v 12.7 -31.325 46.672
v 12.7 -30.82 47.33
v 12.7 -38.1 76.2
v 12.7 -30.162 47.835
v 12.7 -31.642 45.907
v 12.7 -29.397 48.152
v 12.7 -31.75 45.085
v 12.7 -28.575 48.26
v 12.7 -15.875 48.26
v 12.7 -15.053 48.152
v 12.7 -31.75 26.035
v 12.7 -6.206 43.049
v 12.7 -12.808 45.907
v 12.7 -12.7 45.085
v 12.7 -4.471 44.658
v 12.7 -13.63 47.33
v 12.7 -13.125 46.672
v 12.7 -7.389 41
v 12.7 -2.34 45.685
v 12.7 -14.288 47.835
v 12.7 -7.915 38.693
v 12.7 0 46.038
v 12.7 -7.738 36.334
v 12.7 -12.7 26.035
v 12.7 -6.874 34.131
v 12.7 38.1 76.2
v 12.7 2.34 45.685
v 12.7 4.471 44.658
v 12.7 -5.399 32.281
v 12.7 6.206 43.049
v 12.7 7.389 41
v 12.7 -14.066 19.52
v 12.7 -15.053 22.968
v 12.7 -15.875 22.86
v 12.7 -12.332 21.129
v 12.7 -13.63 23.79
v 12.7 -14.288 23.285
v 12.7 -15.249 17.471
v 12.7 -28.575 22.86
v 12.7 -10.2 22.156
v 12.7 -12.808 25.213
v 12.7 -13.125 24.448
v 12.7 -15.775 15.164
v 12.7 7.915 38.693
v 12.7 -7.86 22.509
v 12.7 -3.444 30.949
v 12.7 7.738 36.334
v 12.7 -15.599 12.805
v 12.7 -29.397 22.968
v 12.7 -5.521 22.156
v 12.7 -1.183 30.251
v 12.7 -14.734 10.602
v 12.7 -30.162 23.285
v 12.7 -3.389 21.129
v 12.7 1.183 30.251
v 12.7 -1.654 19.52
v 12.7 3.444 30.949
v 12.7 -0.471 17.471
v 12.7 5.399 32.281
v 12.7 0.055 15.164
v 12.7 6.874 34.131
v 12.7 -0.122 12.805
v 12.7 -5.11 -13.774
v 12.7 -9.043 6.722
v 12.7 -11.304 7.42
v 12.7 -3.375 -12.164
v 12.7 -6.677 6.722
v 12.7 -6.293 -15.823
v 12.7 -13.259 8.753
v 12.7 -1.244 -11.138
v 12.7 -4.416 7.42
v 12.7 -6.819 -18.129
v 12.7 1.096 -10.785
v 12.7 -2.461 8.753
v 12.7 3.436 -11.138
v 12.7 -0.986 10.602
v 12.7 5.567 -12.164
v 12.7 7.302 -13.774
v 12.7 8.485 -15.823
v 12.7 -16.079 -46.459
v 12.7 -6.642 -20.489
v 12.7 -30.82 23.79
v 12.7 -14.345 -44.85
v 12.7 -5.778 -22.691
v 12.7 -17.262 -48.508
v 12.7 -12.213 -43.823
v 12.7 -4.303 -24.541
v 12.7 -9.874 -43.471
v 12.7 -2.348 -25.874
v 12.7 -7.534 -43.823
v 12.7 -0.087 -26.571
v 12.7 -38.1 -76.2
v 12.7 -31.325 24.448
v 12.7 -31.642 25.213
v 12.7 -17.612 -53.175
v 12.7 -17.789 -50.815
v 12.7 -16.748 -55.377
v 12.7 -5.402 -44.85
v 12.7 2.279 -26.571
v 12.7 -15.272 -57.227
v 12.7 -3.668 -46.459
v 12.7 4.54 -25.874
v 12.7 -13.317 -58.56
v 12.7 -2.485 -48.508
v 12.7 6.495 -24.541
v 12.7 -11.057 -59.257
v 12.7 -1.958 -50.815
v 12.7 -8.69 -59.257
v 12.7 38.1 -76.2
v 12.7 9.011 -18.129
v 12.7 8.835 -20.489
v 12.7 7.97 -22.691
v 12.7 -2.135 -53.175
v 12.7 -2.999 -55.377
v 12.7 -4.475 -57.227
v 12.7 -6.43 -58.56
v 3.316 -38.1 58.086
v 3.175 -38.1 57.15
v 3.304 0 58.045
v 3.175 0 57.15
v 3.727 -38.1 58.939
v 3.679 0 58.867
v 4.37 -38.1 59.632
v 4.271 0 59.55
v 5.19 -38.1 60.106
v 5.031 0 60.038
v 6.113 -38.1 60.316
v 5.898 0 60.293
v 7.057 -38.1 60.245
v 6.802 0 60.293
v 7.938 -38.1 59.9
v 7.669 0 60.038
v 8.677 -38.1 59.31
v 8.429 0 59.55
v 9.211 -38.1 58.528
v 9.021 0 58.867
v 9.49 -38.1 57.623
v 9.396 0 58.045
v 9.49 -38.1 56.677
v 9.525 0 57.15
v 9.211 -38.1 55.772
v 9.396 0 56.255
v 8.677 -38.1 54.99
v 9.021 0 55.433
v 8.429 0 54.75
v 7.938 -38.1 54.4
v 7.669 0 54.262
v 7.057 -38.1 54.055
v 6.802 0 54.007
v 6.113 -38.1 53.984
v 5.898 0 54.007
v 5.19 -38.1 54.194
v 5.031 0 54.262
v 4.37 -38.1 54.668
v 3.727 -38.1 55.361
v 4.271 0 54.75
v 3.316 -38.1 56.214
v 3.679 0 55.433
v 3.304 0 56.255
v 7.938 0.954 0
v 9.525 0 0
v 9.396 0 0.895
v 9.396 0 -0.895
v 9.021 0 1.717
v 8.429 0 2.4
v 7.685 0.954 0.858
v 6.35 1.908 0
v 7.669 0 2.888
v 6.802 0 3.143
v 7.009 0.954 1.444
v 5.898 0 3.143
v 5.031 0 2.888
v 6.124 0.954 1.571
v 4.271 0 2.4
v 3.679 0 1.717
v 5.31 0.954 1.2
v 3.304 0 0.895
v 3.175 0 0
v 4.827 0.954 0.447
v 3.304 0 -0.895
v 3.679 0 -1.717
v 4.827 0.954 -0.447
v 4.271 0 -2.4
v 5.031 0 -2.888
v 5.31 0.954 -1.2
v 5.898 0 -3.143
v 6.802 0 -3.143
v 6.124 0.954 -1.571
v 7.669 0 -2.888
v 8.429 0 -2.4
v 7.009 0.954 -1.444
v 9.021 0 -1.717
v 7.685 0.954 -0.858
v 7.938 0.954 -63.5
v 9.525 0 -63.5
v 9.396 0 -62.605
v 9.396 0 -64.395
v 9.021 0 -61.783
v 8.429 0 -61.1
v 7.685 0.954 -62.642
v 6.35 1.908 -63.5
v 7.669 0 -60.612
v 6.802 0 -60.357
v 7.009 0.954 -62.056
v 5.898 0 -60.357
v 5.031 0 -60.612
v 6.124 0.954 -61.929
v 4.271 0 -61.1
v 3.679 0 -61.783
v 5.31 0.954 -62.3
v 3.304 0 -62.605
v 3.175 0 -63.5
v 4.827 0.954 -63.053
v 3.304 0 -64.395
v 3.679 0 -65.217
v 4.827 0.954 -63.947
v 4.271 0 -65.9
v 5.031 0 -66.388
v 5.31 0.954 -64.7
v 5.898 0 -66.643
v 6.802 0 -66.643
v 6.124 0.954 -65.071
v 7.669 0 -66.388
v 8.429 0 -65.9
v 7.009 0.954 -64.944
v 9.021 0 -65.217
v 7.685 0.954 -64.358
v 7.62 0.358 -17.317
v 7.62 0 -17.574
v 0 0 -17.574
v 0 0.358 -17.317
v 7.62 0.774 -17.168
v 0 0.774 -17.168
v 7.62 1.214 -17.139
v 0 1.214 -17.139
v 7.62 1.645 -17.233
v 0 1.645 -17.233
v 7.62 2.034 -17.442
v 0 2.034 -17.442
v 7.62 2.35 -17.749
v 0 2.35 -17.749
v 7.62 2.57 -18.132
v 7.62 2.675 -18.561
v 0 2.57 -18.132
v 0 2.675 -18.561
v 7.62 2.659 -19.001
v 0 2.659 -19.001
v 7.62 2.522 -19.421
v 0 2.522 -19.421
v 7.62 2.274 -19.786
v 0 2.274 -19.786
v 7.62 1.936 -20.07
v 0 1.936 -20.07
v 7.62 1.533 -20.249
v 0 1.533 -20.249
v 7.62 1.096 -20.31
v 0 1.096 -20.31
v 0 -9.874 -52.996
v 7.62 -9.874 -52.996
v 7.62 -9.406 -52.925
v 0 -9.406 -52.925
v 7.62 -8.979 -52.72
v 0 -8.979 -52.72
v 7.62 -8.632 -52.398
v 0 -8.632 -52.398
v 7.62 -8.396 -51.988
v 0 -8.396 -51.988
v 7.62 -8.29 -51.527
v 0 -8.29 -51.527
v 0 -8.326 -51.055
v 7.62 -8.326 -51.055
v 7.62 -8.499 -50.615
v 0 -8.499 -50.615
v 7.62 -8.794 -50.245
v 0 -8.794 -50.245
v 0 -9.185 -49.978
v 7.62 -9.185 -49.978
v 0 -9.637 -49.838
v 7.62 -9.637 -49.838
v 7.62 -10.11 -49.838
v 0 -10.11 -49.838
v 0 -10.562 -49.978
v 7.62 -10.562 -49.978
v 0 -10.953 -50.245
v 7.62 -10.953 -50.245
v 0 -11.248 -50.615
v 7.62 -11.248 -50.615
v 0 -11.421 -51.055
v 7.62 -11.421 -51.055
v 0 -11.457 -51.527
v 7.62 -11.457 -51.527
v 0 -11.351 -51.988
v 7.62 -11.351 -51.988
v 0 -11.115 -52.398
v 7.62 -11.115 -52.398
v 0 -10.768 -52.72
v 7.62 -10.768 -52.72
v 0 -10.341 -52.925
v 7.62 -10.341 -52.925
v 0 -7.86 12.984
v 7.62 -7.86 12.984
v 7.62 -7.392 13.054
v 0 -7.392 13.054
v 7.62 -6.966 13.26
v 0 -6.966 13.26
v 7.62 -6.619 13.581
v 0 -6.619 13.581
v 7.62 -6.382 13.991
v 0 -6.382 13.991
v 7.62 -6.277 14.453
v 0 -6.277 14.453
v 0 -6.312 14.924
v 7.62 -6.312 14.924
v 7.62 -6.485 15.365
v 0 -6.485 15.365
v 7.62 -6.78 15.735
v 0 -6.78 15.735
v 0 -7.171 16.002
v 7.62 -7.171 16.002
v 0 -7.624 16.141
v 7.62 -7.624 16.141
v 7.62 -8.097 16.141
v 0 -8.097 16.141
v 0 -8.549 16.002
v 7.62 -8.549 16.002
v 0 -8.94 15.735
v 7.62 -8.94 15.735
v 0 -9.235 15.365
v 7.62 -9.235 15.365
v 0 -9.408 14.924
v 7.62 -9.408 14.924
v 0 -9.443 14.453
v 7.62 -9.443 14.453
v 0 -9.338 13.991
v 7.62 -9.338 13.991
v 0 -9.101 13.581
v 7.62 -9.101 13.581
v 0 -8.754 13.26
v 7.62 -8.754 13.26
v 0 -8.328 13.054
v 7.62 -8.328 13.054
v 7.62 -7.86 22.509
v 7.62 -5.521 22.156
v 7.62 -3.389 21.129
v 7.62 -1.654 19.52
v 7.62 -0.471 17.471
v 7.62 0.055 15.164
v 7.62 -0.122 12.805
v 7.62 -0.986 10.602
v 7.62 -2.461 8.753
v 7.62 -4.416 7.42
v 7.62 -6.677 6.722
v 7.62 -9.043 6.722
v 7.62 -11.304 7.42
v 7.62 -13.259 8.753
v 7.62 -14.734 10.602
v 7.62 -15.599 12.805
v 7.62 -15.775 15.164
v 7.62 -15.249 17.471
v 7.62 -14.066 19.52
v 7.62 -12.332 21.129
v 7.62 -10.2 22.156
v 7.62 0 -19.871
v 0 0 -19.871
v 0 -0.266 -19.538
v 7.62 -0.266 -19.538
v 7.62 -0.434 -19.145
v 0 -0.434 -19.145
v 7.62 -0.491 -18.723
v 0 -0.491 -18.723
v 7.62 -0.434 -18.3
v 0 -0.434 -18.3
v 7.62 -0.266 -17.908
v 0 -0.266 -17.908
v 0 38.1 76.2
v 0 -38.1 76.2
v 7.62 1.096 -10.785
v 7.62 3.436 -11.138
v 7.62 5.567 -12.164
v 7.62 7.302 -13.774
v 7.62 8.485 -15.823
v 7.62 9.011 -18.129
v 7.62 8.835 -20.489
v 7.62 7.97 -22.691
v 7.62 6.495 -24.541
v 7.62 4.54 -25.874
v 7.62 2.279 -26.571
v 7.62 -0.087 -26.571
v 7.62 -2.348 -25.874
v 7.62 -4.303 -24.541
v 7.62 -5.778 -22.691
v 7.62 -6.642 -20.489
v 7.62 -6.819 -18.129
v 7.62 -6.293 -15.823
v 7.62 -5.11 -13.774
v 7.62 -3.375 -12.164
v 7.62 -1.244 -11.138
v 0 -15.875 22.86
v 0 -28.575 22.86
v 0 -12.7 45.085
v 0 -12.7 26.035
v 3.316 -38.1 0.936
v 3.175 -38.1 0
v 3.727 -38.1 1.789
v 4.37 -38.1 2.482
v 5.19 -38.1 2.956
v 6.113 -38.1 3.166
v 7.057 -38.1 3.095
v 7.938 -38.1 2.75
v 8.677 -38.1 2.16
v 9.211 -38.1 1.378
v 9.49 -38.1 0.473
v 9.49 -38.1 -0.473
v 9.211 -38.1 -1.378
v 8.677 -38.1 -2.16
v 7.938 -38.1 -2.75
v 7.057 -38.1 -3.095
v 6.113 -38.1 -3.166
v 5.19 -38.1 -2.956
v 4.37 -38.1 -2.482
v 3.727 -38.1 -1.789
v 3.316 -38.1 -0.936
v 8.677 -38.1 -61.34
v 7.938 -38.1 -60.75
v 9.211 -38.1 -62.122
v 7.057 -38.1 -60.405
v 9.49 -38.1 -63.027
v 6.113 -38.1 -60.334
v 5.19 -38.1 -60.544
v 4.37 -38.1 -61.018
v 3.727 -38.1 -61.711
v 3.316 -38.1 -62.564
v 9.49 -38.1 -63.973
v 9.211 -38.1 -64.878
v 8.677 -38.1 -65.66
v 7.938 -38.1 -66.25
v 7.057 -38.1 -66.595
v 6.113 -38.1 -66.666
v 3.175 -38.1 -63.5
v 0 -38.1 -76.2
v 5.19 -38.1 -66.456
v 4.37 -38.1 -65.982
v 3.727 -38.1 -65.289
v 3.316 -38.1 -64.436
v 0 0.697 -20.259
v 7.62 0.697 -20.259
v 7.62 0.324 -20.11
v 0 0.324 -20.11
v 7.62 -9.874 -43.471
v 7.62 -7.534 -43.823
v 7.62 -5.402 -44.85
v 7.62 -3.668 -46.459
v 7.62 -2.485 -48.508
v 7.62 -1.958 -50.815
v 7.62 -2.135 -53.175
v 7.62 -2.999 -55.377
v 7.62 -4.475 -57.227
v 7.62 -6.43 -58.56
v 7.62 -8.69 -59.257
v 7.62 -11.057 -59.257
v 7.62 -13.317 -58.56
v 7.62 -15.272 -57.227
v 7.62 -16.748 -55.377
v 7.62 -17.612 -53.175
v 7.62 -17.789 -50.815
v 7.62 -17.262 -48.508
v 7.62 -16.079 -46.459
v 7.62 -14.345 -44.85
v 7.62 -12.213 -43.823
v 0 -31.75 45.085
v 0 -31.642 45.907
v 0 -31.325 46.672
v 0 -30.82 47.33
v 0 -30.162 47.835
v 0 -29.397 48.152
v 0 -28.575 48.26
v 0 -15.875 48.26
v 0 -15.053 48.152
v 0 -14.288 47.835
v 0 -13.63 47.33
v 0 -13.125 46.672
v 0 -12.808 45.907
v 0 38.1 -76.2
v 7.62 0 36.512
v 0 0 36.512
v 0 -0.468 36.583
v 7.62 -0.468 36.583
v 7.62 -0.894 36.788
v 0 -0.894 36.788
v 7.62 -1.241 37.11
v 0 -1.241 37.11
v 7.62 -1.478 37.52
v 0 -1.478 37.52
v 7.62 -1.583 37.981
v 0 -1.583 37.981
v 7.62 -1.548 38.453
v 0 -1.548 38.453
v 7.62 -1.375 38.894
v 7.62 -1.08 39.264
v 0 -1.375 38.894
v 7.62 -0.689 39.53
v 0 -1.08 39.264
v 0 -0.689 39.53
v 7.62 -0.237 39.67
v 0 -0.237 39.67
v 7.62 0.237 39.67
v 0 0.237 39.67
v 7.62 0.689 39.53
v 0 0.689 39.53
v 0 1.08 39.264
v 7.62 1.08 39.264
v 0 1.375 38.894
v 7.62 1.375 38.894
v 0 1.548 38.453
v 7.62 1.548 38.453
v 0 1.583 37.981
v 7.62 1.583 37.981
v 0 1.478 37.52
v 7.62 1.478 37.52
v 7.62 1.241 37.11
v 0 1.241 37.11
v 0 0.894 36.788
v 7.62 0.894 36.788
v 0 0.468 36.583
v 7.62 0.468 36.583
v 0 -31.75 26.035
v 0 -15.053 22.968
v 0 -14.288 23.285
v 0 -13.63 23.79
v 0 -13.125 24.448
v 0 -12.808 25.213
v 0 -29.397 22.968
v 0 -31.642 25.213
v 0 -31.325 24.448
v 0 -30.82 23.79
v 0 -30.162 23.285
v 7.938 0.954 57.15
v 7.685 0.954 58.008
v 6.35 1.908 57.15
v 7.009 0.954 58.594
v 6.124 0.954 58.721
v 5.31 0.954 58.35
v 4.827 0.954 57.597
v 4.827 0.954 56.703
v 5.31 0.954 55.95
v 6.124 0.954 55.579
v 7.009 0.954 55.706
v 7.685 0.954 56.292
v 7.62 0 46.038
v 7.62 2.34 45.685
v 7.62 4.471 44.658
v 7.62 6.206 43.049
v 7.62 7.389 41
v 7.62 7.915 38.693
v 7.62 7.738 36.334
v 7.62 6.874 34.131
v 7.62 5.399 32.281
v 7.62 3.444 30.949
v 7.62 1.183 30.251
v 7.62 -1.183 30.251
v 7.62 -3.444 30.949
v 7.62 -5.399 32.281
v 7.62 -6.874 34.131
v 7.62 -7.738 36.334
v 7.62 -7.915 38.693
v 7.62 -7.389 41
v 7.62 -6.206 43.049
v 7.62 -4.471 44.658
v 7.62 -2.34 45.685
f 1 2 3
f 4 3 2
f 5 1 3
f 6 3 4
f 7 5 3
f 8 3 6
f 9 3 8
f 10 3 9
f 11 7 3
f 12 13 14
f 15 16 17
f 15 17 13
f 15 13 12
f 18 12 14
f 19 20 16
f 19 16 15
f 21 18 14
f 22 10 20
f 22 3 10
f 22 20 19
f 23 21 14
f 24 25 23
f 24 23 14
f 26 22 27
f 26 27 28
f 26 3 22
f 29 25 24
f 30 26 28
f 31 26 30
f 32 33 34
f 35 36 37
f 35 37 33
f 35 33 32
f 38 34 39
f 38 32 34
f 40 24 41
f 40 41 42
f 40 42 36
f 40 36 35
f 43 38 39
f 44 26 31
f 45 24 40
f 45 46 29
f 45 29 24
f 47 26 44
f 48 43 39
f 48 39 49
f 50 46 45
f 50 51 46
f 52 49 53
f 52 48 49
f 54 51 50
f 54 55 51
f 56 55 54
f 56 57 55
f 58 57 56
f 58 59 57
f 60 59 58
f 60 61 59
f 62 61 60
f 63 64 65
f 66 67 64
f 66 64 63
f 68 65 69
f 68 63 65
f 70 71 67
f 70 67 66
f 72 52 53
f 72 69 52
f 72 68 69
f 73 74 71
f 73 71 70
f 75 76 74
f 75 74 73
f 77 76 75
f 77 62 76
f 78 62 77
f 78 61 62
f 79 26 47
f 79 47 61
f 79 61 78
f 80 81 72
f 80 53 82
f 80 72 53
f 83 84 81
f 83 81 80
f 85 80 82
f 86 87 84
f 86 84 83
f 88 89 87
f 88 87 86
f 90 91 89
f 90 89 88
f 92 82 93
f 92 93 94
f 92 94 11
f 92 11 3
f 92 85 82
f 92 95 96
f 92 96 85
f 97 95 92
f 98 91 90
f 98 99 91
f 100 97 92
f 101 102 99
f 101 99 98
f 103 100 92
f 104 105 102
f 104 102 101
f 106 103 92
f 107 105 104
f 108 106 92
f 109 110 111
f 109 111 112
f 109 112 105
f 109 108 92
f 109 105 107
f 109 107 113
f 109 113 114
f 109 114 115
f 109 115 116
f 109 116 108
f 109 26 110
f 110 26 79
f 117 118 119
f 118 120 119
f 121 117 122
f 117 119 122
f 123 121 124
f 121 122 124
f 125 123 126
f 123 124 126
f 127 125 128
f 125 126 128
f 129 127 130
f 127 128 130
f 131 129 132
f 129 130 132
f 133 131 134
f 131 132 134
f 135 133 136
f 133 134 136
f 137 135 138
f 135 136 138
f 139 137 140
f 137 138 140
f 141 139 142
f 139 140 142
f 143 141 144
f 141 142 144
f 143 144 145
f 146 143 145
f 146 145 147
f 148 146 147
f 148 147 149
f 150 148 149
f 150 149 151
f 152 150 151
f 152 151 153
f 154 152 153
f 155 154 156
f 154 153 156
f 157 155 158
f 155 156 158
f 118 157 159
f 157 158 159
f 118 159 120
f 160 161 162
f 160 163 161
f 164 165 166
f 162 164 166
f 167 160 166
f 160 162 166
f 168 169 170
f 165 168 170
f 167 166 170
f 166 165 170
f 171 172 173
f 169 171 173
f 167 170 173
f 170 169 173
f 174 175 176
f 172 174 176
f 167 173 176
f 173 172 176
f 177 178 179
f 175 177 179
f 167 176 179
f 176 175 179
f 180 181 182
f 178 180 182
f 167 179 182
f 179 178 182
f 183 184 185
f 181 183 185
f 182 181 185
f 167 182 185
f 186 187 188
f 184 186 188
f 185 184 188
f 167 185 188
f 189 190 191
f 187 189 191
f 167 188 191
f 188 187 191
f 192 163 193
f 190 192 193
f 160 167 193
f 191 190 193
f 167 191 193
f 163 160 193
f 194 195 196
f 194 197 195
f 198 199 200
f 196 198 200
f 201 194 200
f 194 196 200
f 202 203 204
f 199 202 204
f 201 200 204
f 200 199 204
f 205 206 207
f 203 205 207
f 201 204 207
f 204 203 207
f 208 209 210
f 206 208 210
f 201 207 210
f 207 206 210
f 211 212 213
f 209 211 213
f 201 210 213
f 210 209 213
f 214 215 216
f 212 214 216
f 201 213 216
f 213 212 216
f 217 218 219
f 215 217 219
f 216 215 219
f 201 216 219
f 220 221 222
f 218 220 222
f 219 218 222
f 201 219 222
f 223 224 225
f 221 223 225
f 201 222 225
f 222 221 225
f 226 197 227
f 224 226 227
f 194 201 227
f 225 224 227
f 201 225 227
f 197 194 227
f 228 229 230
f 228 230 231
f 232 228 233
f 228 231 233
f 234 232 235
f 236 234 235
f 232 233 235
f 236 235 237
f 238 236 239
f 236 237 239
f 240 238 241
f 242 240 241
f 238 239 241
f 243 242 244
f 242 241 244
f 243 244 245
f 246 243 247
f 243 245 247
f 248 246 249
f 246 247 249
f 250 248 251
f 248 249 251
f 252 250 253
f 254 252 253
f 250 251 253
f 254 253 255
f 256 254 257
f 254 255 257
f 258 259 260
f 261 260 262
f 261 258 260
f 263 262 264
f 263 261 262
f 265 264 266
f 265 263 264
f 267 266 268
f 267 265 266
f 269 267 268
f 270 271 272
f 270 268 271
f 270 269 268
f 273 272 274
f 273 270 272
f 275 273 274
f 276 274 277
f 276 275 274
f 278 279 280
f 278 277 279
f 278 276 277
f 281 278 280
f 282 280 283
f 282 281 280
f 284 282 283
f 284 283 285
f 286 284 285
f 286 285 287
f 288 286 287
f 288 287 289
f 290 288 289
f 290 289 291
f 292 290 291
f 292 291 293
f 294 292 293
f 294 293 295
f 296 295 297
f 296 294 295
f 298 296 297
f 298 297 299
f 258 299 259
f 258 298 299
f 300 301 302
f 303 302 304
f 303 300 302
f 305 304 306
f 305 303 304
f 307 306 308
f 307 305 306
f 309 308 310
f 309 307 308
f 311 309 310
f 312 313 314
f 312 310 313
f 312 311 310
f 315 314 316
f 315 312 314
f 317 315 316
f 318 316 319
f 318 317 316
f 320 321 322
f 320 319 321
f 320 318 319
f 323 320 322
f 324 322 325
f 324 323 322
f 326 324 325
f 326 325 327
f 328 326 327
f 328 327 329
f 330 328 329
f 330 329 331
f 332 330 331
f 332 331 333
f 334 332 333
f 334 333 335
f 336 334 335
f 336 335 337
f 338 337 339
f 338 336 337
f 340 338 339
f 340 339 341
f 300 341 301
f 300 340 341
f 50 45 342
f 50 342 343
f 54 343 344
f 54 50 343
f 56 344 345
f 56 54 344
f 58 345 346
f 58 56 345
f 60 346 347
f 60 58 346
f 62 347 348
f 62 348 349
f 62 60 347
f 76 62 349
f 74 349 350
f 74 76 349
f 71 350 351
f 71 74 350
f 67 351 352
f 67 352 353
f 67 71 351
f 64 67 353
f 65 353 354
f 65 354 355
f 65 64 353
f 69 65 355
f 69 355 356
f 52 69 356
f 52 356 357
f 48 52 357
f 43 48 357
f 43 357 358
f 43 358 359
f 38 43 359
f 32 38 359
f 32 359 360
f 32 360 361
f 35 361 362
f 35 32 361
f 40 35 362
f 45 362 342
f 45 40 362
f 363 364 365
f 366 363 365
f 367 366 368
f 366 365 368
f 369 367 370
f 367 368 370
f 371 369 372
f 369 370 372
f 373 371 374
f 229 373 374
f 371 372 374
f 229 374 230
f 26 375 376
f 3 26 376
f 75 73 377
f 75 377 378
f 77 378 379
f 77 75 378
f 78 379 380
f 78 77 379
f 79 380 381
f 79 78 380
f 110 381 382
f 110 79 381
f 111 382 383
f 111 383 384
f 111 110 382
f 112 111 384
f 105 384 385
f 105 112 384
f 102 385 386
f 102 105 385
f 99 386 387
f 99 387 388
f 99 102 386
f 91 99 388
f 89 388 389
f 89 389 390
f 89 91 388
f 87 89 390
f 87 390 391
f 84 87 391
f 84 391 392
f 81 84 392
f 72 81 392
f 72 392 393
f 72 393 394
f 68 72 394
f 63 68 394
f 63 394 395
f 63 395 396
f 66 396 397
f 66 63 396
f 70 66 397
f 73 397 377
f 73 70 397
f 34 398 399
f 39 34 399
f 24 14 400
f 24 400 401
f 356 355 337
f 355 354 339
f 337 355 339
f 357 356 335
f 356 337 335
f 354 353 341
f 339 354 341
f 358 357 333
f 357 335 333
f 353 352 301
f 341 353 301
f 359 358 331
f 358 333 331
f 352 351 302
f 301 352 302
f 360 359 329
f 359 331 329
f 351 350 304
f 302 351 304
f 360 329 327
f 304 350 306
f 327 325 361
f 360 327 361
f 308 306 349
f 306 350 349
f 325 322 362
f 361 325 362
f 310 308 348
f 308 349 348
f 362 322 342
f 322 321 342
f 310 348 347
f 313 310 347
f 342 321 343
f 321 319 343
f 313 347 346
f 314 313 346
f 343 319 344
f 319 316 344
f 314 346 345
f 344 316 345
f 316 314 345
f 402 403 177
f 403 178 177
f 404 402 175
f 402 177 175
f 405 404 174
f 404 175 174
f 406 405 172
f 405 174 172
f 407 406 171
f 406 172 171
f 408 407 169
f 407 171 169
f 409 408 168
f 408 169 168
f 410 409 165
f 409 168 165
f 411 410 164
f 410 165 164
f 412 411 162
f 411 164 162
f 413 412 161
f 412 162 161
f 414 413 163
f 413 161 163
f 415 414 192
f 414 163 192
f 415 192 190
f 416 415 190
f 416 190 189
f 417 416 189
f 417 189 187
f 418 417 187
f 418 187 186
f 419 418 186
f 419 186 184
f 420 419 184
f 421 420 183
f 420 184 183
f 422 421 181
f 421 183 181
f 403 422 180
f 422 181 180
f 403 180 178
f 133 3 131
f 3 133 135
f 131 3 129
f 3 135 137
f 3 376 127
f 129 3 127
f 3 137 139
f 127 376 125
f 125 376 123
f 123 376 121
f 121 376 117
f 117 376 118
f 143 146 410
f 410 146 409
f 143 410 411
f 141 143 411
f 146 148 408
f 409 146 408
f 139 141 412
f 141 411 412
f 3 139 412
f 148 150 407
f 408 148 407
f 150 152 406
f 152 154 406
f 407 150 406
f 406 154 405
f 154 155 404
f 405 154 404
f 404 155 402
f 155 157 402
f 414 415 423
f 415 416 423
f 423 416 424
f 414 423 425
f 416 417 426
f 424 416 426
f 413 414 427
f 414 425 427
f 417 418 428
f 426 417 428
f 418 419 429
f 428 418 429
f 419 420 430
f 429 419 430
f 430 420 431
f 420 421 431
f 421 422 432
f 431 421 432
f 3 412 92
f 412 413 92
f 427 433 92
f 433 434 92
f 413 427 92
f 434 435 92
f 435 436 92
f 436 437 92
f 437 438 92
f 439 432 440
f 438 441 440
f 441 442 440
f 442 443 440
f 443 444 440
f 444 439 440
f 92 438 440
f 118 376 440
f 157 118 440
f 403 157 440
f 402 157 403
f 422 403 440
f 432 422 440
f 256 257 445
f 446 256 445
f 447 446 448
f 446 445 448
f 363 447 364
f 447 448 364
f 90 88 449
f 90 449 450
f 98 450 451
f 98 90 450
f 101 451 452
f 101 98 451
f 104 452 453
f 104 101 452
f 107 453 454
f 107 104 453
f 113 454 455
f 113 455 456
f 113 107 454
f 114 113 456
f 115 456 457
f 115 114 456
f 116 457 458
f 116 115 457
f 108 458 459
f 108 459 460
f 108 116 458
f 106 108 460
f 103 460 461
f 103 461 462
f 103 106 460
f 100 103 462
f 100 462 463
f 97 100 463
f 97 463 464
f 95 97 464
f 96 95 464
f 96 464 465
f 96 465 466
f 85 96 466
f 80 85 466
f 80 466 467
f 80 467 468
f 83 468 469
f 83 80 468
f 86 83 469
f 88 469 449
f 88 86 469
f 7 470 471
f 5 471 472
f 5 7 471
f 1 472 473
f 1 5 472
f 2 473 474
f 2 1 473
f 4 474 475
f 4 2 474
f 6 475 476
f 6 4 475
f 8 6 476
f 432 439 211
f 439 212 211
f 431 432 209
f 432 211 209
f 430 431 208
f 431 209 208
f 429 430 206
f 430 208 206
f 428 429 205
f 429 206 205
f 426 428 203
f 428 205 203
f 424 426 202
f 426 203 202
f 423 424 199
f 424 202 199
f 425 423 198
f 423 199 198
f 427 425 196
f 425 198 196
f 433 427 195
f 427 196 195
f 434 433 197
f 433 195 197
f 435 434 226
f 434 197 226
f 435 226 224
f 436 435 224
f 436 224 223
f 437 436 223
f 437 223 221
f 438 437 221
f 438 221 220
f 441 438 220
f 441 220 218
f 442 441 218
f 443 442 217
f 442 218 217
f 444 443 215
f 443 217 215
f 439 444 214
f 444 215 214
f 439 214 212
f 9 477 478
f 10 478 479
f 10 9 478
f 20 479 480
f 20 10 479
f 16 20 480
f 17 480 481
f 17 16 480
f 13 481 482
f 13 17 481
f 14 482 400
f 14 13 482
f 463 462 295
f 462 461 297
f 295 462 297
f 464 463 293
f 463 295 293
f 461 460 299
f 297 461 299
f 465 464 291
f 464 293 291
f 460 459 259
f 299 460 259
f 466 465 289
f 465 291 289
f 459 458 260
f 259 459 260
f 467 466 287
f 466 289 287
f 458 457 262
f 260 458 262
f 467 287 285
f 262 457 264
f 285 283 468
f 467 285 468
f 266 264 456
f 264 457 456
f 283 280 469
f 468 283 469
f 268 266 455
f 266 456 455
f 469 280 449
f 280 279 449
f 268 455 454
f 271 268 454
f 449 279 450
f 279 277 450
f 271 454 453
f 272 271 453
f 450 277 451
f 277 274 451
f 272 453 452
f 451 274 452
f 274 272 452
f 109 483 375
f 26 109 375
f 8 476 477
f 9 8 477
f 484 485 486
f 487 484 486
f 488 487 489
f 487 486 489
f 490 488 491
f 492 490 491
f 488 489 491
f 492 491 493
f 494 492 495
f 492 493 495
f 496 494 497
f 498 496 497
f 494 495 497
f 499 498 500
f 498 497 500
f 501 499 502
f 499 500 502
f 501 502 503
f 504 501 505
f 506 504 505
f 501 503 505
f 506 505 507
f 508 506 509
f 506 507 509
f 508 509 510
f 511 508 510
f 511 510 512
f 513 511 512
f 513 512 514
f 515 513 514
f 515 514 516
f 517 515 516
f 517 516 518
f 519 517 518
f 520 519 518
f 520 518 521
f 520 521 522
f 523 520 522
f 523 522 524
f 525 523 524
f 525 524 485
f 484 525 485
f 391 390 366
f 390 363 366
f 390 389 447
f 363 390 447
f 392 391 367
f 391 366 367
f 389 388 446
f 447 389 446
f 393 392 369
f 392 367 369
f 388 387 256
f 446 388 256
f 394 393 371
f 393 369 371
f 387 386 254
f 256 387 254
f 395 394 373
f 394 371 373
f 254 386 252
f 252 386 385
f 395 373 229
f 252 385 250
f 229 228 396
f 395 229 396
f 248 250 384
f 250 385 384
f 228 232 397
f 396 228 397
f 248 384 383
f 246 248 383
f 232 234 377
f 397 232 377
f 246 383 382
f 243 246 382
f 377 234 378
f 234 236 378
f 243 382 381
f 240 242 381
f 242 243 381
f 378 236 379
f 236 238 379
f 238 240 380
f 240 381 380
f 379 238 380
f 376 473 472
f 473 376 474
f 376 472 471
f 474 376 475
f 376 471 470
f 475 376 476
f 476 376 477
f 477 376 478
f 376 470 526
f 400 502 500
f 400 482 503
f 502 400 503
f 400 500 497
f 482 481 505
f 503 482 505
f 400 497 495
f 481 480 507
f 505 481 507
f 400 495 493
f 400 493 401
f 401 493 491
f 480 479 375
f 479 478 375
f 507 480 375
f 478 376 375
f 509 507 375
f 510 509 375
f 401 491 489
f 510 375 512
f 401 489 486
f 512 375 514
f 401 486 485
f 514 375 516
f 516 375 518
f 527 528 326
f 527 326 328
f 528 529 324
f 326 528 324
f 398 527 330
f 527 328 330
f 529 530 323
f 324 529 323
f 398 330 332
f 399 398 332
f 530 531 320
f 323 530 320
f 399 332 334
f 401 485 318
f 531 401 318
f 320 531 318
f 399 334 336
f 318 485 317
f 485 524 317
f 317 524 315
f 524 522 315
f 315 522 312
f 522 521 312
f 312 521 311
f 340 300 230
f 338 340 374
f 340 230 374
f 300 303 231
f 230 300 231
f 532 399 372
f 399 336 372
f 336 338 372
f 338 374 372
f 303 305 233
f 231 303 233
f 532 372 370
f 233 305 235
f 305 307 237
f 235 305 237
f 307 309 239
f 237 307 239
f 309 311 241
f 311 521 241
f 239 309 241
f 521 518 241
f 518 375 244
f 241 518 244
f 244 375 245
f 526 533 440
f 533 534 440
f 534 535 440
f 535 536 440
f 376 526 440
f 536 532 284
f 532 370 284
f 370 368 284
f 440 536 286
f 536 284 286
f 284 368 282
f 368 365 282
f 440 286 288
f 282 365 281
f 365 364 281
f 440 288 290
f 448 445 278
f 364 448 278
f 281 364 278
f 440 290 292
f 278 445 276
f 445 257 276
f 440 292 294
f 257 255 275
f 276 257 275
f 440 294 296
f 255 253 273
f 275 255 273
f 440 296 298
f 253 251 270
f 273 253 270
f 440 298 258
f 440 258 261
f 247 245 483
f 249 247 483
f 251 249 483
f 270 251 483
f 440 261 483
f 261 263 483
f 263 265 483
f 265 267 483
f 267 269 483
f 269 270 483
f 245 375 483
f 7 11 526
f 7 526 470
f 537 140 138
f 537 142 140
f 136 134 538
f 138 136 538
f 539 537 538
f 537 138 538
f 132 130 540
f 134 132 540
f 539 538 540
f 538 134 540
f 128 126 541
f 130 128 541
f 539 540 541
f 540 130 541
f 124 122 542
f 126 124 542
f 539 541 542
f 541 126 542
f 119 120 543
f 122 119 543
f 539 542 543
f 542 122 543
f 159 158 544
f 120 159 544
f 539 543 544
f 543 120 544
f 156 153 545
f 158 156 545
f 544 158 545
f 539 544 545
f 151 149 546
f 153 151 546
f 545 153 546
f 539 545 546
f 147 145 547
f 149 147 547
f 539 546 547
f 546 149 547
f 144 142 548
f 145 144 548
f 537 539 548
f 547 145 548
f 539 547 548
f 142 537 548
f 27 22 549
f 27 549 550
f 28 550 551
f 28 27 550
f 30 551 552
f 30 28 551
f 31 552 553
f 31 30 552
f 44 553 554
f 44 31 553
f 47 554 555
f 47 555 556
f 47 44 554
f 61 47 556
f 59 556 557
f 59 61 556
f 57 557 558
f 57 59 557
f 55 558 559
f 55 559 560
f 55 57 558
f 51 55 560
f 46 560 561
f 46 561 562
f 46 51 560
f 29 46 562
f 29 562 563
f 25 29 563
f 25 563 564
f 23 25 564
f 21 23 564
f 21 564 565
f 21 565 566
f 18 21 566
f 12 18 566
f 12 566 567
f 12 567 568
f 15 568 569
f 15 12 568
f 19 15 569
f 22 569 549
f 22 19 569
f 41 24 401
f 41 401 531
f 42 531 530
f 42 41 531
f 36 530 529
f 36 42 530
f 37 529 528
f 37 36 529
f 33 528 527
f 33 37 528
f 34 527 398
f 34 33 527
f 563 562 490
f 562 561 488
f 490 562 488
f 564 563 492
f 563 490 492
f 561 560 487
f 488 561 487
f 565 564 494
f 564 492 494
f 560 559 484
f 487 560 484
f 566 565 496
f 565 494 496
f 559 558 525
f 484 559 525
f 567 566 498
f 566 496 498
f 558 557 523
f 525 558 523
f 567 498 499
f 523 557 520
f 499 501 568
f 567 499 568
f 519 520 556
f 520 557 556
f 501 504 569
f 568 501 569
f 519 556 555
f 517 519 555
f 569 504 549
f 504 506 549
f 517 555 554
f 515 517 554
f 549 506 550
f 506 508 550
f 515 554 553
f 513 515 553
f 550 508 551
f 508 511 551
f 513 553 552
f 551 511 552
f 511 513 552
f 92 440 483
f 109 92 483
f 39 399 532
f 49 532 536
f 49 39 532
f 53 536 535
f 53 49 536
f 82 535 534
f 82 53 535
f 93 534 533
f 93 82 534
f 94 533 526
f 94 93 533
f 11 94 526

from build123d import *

# Parameters (mm, degrees)
SKETCH1_W                       = 152.4
SKETCH1_H                       = 76.2
SKETCH1_R                       = 1.5875
BOSS_EXTRUDE1_DEPTH             = 12.7
SKETCH2_R                       = 7.9375
CUT_EXTRUDE1_DEPTH              = 5.08
F_1_4_0_25_DIAMETER_HOLE1_D     = 6.35
F_1_4_0_25_DIAMETER_HOLE1_DEPTH = 38.1
F_1_4_0_25_DIAMETER_HOLE1_TIP   = 1.907732465
CUT_EXTRUDE2_DEPTH              = 25.4


with BuildPart() as part:
    # Sketch1 → Boss-Extrude1 (new body)
    with BuildSketch(Plane(origin=(0, 0, 0), x_dir=(0, 0, -1), z_dir=(1, 0, 0))):
        Rectangle(SKETCH1_W, SKETCH1_H)
        with Locations((18.72253158, 1.096077429)):
            Circle(SKETCH1_R, mode=Mode.SUBTRACT)
        with Locations((-38.1, 0)):
            Circle(SKETCH1_R, mode=Mode.SUBTRACT)
        with Locations((-14.571224015, -7.860160654)):
            Circle(SKETCH1_R, mode=Mode.SUBTRACT)
        with Locations((51.408255992, -9.873506971)):
            Circle(SKETCH1_R, mode=Mode.SUBTRACT)
    extrude(amount=BOSS_EXTRUDE1_DEPTH)

    # Sketch2 → Cut-Extrude1 (cut)
    with BuildSketch(Plane.ZY.offset(-12.7)):
        with Locations((38.1, 0)):
            Circle(SKETCH2_R)
        with Locations((14.571224015, -7.860160654)):
            Circle(SKETCH2_R)
        with Locations((-18.72253158, 1.096077429)):
            Circle(SKETCH2_R)
        with Locations((-51.408255992, -9.873506971)):
            Circle(SKETCH2_R)
    extrude(amount=CUT_EXTRUDE1_DEPTH, mode=Mode.SUBTRACT)

    # 1/4 (0.25) Diameter Hole1
    with Locations(Plane.XZ.offset(38.1)):
        with Locations((6.35, -63.5), (6.35, 0), (6.35, 57.15)):
            Hole(F_1_4_0_25_DIAMETER_HOLE1_D / 2, depth=F_1_4_0_25_DIAMETER_HOLE1_DEPTH)
            with Locations((0, 0, -(F_1_4_0_25_DIAMETER_HOLE1_DEPTH + F_1_4_0_25_DIAMETER_HOLE1_TIP / 2))):  # 118° drill point
                Cone(0, F_1_4_0_25_DIAMETER_HOLE1_D / 2, F_1_4_0_25_DIAMETER_HOLE1_TIP, mode=Mode.SUBTRACT)

    # Sketch5 → Cut-Extrude2 (cut)
    with BuildSketch(Plane(origin=(12.7, 0, 0), x_dir=(0, 0, -1), z_dir=(1, 0, 0))):
        with BuildLine():
            Line((-45.085, -12.7), (-26.035, -12.7))
            ThreePointArc((-26.035, -12.7), (-23.78993597, -13.62993597), (-22.86, -15.875))
            Line((-22.86, -15.875), (-22.86, -28.575))
            ThreePointArc((-22.86, -28.575), (-23.78993597, -30.82006403), (-26.035, -31.75))
            Line((-26.035, -31.75), (-45.085, -31.75))
            ThreePointArc((-45.085, -31.75), (-47.33006403, -30.82006403), (-48.26, -28.575))
            Line((-48.26, -28.575), (-48.26, -15.875))
            ThreePointArc((-48.26, -15.875), (-47.33006403, -13.62993597), (-45.085, -12.7))
        make_face()
    extrude(amount=-CUT_EXTRUDE2_DEPTH, mode=Mode.SUBTRACT)


solid = part.part
